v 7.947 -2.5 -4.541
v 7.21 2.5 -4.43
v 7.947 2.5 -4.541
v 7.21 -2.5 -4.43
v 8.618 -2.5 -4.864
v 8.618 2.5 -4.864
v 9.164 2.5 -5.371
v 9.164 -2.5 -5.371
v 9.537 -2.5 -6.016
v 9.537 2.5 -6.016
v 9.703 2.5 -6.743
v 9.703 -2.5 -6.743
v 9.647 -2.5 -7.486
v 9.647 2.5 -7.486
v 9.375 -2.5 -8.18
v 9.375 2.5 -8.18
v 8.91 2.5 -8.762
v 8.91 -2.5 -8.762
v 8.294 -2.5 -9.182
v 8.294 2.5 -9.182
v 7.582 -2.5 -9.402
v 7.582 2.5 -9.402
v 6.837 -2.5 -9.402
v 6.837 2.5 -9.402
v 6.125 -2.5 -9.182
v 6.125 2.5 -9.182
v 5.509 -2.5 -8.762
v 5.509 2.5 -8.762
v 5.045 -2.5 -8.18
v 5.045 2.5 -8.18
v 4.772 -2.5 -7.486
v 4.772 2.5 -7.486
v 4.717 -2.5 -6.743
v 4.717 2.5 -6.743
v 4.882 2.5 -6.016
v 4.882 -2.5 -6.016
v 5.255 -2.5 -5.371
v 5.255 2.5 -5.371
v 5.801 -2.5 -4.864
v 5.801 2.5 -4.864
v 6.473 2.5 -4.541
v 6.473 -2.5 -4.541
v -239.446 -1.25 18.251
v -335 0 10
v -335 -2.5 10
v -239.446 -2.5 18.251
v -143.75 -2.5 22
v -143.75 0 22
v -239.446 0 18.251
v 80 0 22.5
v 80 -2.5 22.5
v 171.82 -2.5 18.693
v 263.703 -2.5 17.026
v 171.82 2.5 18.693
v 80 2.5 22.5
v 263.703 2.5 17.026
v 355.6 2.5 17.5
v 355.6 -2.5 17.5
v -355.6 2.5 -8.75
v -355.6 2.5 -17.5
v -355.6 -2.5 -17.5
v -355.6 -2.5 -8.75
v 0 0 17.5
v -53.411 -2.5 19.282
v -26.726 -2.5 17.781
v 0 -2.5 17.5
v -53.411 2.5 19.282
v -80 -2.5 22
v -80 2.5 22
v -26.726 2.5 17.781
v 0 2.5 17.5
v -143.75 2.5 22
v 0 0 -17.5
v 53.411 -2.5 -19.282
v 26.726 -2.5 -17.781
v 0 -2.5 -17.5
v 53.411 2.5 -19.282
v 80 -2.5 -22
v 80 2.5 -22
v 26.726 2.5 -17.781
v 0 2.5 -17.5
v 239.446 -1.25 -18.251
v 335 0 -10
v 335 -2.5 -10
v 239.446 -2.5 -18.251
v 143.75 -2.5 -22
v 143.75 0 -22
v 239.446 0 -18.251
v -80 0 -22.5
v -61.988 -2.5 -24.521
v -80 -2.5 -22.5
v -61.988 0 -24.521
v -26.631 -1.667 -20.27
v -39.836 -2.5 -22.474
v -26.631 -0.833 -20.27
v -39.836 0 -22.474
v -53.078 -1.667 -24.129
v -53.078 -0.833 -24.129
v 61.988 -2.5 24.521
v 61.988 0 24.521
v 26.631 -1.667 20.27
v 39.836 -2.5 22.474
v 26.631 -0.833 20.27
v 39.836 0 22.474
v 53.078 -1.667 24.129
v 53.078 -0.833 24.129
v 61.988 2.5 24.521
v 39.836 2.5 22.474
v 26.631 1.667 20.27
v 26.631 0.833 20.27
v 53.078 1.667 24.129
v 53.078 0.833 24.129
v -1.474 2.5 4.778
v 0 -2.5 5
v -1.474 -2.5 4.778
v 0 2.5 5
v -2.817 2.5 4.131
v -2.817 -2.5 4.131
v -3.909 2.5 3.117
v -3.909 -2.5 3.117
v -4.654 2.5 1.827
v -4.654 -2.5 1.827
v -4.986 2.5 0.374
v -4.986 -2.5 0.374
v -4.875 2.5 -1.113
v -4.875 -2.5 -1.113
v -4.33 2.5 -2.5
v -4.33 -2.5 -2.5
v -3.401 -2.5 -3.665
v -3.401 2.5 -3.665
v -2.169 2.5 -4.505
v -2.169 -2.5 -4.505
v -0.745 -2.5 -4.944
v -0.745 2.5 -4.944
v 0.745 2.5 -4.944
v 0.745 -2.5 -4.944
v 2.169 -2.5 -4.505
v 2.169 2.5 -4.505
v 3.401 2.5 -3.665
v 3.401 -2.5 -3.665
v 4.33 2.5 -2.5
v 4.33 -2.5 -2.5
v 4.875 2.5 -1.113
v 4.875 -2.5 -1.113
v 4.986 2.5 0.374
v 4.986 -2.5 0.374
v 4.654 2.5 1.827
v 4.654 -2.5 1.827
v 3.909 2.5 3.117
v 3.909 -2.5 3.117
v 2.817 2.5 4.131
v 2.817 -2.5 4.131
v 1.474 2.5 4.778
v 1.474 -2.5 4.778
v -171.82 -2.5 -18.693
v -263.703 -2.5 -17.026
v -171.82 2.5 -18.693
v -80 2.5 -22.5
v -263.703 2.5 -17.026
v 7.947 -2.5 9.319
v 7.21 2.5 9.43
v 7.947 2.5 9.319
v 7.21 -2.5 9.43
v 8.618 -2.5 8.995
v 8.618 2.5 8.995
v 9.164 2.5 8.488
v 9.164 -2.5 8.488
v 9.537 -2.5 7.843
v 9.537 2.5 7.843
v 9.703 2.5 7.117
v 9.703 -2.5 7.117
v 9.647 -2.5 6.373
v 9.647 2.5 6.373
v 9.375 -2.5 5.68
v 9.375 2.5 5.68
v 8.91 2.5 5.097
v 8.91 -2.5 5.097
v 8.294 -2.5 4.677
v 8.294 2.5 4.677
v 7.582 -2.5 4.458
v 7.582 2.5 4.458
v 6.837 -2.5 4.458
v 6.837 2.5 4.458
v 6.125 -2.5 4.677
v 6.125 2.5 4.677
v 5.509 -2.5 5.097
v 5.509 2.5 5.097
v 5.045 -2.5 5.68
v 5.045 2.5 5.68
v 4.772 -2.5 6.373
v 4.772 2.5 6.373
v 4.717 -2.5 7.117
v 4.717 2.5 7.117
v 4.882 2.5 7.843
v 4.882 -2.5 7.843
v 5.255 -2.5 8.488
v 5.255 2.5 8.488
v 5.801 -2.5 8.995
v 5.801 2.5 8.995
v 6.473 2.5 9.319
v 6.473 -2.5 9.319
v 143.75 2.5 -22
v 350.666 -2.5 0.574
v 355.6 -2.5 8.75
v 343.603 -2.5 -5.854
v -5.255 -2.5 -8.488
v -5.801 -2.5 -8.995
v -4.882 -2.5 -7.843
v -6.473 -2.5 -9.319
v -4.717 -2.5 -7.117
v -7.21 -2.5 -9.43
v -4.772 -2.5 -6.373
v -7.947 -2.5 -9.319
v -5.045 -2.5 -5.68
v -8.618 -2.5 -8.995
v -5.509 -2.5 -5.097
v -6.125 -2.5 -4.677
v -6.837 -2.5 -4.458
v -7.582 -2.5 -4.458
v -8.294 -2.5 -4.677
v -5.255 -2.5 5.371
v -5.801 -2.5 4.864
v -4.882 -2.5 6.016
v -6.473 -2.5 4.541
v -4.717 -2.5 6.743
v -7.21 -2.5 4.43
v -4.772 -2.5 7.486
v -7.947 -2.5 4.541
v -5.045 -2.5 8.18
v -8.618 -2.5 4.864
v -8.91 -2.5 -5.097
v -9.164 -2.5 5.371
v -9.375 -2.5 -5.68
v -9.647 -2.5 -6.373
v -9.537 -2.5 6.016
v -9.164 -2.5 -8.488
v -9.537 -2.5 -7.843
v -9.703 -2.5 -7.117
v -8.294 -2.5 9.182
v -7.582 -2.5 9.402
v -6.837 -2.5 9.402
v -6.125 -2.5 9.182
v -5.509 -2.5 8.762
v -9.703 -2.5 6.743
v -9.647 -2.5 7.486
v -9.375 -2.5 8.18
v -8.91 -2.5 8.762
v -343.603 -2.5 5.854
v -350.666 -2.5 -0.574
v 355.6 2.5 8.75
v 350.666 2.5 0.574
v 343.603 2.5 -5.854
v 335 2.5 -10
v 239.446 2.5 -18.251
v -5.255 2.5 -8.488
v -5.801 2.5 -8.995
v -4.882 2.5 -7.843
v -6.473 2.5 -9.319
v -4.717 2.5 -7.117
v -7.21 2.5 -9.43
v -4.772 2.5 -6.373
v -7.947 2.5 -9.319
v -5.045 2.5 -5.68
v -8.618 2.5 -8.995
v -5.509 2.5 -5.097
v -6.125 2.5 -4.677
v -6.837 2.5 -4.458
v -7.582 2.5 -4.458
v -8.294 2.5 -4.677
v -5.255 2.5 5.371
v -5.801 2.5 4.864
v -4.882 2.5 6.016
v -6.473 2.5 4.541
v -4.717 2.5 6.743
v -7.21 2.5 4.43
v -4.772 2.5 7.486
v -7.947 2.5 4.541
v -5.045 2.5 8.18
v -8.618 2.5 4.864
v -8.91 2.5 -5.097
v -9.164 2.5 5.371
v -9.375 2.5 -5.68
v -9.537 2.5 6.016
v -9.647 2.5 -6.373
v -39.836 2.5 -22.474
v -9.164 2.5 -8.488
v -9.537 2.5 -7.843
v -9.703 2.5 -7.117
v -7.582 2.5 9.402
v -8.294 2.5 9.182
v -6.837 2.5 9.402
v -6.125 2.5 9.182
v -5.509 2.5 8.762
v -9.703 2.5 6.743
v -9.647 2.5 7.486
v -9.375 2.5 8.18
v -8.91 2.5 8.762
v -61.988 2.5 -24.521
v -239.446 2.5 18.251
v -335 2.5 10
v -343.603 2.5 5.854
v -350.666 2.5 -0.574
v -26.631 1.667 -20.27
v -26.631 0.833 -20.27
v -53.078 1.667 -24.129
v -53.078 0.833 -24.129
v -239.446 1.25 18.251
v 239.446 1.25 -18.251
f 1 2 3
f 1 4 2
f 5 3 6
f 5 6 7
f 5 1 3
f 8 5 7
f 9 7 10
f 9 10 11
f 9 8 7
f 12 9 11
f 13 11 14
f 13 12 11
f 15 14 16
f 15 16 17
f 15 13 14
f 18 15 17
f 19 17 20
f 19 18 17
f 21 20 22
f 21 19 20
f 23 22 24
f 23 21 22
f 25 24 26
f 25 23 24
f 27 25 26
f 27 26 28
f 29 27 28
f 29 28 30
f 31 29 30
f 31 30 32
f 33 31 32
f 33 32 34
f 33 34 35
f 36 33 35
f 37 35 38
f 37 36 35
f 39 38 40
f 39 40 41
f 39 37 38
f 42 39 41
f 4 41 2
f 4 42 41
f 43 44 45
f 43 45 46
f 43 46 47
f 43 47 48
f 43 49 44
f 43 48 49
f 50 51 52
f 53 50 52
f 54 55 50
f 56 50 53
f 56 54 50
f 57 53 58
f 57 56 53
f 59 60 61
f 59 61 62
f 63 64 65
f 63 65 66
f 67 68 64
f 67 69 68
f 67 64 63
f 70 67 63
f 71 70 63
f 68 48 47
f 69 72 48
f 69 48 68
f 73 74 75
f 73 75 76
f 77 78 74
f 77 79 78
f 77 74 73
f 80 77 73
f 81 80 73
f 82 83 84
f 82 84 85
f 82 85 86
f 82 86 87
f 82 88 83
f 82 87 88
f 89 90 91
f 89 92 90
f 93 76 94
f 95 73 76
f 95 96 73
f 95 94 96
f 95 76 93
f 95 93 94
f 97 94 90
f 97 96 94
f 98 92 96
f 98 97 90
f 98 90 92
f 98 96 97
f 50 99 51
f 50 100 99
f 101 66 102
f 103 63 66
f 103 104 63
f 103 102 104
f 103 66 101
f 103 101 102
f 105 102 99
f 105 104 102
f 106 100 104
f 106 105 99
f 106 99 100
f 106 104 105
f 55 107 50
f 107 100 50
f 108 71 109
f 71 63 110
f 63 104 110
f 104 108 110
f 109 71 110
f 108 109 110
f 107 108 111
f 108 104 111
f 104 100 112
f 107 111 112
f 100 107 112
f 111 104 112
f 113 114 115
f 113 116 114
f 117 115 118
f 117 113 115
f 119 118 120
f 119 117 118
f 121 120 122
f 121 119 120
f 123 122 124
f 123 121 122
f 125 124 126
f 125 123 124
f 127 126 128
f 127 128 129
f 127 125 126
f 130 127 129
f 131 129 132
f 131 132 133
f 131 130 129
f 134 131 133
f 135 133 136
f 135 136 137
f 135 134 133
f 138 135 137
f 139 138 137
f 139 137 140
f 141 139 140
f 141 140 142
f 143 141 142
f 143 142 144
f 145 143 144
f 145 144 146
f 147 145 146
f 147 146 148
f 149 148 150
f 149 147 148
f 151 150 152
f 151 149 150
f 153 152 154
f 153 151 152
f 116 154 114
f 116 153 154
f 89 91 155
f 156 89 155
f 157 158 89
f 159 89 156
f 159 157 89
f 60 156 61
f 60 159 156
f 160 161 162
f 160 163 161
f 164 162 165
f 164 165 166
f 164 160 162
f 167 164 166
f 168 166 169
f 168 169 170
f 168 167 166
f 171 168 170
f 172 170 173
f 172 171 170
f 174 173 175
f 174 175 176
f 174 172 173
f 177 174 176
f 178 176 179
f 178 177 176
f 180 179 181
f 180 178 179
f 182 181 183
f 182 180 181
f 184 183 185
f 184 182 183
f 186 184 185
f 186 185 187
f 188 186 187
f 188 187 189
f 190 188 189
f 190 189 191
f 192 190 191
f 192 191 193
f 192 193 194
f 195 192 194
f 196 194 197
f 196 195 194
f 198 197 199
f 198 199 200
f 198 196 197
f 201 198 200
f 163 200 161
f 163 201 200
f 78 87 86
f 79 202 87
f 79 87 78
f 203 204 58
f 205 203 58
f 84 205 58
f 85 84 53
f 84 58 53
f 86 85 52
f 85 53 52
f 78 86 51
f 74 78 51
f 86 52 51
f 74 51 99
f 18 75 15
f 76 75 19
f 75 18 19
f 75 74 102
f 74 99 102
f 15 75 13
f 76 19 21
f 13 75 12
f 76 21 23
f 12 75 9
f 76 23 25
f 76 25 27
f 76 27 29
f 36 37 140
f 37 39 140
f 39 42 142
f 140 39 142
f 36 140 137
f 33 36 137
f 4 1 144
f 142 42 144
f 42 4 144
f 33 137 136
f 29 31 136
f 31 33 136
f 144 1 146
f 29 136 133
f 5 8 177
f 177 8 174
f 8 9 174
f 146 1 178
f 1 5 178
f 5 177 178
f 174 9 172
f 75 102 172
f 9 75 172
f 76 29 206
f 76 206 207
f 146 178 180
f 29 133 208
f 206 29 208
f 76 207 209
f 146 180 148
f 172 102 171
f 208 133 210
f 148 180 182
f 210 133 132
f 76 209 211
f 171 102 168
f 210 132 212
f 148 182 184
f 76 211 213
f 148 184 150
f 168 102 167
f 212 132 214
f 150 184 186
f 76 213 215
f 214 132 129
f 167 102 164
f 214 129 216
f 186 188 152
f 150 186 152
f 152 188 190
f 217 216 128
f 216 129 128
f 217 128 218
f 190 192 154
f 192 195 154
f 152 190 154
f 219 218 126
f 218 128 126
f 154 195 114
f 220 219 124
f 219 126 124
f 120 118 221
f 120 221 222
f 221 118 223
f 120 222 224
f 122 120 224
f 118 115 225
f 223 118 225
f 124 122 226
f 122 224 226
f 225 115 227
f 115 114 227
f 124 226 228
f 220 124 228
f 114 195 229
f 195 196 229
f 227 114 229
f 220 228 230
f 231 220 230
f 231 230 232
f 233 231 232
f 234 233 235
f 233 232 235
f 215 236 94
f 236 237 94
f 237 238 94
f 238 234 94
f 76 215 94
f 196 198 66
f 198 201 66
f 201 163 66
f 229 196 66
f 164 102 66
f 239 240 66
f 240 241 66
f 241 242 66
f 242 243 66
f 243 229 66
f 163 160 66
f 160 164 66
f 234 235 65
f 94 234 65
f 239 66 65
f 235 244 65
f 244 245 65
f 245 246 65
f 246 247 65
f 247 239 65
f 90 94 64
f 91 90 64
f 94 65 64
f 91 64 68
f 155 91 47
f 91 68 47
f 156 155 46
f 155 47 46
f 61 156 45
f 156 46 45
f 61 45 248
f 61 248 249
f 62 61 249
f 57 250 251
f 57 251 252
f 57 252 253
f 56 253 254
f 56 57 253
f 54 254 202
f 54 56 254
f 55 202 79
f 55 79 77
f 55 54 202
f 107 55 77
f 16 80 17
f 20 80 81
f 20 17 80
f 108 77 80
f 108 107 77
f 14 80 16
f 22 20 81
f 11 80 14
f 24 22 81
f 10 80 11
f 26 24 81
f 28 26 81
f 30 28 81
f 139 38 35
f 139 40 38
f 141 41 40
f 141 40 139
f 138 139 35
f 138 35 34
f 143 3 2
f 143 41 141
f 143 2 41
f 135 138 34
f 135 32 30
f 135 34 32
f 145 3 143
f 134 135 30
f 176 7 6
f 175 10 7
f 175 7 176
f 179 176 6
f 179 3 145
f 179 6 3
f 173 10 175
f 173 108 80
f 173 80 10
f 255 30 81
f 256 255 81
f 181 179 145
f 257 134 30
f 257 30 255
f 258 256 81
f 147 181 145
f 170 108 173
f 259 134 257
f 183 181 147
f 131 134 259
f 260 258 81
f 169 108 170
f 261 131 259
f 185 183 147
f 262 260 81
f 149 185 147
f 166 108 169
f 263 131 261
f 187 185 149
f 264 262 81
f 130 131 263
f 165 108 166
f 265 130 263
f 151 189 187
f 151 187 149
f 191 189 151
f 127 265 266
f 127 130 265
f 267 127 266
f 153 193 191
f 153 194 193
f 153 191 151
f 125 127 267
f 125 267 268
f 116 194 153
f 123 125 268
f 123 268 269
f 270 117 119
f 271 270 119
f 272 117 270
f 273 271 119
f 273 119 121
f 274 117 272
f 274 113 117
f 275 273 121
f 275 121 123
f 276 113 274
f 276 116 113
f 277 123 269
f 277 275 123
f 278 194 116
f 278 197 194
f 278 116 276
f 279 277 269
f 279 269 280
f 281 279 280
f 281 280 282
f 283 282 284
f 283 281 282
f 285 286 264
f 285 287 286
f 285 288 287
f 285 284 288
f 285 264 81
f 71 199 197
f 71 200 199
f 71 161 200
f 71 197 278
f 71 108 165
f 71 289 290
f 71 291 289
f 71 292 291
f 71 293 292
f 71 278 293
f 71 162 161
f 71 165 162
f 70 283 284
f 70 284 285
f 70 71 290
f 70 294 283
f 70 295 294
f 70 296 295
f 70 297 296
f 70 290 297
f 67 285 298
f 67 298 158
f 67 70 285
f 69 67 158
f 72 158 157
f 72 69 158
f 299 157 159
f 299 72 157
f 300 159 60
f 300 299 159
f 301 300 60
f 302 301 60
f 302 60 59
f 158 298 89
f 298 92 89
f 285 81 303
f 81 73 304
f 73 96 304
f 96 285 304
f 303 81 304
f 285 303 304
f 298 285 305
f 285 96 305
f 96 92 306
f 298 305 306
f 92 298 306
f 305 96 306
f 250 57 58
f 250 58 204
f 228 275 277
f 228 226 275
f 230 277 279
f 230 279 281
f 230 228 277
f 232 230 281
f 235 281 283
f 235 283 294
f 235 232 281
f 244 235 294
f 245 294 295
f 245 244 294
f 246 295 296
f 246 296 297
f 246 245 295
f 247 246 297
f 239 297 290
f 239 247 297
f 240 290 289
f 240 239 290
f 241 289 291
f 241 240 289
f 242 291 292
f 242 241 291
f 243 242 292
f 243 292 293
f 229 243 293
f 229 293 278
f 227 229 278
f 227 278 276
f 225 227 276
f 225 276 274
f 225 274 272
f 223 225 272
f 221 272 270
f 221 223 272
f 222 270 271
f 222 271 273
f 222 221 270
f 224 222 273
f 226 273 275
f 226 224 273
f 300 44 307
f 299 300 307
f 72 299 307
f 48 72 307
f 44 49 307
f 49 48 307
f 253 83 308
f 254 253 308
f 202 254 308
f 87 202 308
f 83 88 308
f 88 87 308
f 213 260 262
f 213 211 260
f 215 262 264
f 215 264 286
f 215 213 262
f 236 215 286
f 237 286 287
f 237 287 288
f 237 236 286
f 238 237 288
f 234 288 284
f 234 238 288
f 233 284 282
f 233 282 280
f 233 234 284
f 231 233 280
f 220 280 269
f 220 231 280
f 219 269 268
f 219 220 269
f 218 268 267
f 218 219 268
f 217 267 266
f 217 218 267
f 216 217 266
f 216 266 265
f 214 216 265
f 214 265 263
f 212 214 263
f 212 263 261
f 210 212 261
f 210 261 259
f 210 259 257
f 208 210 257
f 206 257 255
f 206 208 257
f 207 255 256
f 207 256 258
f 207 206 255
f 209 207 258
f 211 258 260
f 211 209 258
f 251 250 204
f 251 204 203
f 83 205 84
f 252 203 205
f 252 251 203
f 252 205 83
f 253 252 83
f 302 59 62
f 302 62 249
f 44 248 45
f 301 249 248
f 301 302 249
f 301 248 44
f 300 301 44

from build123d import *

# Parameters (mm, degrees)
SKETCH1_R           = 2.5
BOSS_EXTRUDE1_DEPTH = 2.5
CIRPATTERN1_COUNT   = 2


with BuildPart() as part:
    # Sketch1 → Boss-Extrude1 (new, symmetric)
    with BuildSketch(Plane(origin=(0, 0, 0), x_dir=(1, 0, 0), z_dir=(0, 1, 0))):
        with BuildLine():
            ThreePointArc((0, 5), (5, 0), (0, -5))
            Line((0, -5), (0, -17.5))
            add(Edge.make_bspline(
                [(0, -17.5), (26.944118738, -17.53258197), (52.619662803, -29.065950844), (80, -22.5)],
                knots=[0, 0, 0, 0, 1, 1, 1, 1], degree=3))
            ThreePointArc((80, -22.5), (217.756302371, -17.591386703), (355.6, -17.5))
            Line((355.6, -17.5), (355.6, -8.75))
            ThreePointArc((355.6, -8.75), (347.367245335, 2.896213541), (335, 10))
            add(Edge.make_bspline(
                [(335, 10), (239.516107029, 20.502209099), (143.75, 22)],
                knots=[0, 0, 0, 0.750368183, 0.750368183, 0.750368183], degree=2))
            Line((143.75, 22), (80, 22))
            ThreePointArc((80, 22), (40.077104301, 18.379256879), (0, 17.5))
            Line((0, 17.5), (0, 5))
        make_face()
        with Locations((7.209644007, 6.929721011)):
            Circle(SKETCH1_R, mode=Mode.SUBTRACT)
        with Locations((7.209644007, -6.929721011)):
            Circle(SKETCH1_R, mode=Mode.SUBTRACT)
    boss_extrude1 = extrude(amount=BOSS_EXTRUDE1_DEPTH, both=True)

    # CirPattern1: Boss-Extrude1 ×2 about axis
    cirpattern1_axis = Axis((0, -2.5, 0), (0, 1, 0))
    for i in range(1, CIRPATTERN1_COUNT):
        add(boss_extrude1.rotate(cirpattern1_axis, i * 360 / CIRPATTERN1_COUNT))


solid = part.part
